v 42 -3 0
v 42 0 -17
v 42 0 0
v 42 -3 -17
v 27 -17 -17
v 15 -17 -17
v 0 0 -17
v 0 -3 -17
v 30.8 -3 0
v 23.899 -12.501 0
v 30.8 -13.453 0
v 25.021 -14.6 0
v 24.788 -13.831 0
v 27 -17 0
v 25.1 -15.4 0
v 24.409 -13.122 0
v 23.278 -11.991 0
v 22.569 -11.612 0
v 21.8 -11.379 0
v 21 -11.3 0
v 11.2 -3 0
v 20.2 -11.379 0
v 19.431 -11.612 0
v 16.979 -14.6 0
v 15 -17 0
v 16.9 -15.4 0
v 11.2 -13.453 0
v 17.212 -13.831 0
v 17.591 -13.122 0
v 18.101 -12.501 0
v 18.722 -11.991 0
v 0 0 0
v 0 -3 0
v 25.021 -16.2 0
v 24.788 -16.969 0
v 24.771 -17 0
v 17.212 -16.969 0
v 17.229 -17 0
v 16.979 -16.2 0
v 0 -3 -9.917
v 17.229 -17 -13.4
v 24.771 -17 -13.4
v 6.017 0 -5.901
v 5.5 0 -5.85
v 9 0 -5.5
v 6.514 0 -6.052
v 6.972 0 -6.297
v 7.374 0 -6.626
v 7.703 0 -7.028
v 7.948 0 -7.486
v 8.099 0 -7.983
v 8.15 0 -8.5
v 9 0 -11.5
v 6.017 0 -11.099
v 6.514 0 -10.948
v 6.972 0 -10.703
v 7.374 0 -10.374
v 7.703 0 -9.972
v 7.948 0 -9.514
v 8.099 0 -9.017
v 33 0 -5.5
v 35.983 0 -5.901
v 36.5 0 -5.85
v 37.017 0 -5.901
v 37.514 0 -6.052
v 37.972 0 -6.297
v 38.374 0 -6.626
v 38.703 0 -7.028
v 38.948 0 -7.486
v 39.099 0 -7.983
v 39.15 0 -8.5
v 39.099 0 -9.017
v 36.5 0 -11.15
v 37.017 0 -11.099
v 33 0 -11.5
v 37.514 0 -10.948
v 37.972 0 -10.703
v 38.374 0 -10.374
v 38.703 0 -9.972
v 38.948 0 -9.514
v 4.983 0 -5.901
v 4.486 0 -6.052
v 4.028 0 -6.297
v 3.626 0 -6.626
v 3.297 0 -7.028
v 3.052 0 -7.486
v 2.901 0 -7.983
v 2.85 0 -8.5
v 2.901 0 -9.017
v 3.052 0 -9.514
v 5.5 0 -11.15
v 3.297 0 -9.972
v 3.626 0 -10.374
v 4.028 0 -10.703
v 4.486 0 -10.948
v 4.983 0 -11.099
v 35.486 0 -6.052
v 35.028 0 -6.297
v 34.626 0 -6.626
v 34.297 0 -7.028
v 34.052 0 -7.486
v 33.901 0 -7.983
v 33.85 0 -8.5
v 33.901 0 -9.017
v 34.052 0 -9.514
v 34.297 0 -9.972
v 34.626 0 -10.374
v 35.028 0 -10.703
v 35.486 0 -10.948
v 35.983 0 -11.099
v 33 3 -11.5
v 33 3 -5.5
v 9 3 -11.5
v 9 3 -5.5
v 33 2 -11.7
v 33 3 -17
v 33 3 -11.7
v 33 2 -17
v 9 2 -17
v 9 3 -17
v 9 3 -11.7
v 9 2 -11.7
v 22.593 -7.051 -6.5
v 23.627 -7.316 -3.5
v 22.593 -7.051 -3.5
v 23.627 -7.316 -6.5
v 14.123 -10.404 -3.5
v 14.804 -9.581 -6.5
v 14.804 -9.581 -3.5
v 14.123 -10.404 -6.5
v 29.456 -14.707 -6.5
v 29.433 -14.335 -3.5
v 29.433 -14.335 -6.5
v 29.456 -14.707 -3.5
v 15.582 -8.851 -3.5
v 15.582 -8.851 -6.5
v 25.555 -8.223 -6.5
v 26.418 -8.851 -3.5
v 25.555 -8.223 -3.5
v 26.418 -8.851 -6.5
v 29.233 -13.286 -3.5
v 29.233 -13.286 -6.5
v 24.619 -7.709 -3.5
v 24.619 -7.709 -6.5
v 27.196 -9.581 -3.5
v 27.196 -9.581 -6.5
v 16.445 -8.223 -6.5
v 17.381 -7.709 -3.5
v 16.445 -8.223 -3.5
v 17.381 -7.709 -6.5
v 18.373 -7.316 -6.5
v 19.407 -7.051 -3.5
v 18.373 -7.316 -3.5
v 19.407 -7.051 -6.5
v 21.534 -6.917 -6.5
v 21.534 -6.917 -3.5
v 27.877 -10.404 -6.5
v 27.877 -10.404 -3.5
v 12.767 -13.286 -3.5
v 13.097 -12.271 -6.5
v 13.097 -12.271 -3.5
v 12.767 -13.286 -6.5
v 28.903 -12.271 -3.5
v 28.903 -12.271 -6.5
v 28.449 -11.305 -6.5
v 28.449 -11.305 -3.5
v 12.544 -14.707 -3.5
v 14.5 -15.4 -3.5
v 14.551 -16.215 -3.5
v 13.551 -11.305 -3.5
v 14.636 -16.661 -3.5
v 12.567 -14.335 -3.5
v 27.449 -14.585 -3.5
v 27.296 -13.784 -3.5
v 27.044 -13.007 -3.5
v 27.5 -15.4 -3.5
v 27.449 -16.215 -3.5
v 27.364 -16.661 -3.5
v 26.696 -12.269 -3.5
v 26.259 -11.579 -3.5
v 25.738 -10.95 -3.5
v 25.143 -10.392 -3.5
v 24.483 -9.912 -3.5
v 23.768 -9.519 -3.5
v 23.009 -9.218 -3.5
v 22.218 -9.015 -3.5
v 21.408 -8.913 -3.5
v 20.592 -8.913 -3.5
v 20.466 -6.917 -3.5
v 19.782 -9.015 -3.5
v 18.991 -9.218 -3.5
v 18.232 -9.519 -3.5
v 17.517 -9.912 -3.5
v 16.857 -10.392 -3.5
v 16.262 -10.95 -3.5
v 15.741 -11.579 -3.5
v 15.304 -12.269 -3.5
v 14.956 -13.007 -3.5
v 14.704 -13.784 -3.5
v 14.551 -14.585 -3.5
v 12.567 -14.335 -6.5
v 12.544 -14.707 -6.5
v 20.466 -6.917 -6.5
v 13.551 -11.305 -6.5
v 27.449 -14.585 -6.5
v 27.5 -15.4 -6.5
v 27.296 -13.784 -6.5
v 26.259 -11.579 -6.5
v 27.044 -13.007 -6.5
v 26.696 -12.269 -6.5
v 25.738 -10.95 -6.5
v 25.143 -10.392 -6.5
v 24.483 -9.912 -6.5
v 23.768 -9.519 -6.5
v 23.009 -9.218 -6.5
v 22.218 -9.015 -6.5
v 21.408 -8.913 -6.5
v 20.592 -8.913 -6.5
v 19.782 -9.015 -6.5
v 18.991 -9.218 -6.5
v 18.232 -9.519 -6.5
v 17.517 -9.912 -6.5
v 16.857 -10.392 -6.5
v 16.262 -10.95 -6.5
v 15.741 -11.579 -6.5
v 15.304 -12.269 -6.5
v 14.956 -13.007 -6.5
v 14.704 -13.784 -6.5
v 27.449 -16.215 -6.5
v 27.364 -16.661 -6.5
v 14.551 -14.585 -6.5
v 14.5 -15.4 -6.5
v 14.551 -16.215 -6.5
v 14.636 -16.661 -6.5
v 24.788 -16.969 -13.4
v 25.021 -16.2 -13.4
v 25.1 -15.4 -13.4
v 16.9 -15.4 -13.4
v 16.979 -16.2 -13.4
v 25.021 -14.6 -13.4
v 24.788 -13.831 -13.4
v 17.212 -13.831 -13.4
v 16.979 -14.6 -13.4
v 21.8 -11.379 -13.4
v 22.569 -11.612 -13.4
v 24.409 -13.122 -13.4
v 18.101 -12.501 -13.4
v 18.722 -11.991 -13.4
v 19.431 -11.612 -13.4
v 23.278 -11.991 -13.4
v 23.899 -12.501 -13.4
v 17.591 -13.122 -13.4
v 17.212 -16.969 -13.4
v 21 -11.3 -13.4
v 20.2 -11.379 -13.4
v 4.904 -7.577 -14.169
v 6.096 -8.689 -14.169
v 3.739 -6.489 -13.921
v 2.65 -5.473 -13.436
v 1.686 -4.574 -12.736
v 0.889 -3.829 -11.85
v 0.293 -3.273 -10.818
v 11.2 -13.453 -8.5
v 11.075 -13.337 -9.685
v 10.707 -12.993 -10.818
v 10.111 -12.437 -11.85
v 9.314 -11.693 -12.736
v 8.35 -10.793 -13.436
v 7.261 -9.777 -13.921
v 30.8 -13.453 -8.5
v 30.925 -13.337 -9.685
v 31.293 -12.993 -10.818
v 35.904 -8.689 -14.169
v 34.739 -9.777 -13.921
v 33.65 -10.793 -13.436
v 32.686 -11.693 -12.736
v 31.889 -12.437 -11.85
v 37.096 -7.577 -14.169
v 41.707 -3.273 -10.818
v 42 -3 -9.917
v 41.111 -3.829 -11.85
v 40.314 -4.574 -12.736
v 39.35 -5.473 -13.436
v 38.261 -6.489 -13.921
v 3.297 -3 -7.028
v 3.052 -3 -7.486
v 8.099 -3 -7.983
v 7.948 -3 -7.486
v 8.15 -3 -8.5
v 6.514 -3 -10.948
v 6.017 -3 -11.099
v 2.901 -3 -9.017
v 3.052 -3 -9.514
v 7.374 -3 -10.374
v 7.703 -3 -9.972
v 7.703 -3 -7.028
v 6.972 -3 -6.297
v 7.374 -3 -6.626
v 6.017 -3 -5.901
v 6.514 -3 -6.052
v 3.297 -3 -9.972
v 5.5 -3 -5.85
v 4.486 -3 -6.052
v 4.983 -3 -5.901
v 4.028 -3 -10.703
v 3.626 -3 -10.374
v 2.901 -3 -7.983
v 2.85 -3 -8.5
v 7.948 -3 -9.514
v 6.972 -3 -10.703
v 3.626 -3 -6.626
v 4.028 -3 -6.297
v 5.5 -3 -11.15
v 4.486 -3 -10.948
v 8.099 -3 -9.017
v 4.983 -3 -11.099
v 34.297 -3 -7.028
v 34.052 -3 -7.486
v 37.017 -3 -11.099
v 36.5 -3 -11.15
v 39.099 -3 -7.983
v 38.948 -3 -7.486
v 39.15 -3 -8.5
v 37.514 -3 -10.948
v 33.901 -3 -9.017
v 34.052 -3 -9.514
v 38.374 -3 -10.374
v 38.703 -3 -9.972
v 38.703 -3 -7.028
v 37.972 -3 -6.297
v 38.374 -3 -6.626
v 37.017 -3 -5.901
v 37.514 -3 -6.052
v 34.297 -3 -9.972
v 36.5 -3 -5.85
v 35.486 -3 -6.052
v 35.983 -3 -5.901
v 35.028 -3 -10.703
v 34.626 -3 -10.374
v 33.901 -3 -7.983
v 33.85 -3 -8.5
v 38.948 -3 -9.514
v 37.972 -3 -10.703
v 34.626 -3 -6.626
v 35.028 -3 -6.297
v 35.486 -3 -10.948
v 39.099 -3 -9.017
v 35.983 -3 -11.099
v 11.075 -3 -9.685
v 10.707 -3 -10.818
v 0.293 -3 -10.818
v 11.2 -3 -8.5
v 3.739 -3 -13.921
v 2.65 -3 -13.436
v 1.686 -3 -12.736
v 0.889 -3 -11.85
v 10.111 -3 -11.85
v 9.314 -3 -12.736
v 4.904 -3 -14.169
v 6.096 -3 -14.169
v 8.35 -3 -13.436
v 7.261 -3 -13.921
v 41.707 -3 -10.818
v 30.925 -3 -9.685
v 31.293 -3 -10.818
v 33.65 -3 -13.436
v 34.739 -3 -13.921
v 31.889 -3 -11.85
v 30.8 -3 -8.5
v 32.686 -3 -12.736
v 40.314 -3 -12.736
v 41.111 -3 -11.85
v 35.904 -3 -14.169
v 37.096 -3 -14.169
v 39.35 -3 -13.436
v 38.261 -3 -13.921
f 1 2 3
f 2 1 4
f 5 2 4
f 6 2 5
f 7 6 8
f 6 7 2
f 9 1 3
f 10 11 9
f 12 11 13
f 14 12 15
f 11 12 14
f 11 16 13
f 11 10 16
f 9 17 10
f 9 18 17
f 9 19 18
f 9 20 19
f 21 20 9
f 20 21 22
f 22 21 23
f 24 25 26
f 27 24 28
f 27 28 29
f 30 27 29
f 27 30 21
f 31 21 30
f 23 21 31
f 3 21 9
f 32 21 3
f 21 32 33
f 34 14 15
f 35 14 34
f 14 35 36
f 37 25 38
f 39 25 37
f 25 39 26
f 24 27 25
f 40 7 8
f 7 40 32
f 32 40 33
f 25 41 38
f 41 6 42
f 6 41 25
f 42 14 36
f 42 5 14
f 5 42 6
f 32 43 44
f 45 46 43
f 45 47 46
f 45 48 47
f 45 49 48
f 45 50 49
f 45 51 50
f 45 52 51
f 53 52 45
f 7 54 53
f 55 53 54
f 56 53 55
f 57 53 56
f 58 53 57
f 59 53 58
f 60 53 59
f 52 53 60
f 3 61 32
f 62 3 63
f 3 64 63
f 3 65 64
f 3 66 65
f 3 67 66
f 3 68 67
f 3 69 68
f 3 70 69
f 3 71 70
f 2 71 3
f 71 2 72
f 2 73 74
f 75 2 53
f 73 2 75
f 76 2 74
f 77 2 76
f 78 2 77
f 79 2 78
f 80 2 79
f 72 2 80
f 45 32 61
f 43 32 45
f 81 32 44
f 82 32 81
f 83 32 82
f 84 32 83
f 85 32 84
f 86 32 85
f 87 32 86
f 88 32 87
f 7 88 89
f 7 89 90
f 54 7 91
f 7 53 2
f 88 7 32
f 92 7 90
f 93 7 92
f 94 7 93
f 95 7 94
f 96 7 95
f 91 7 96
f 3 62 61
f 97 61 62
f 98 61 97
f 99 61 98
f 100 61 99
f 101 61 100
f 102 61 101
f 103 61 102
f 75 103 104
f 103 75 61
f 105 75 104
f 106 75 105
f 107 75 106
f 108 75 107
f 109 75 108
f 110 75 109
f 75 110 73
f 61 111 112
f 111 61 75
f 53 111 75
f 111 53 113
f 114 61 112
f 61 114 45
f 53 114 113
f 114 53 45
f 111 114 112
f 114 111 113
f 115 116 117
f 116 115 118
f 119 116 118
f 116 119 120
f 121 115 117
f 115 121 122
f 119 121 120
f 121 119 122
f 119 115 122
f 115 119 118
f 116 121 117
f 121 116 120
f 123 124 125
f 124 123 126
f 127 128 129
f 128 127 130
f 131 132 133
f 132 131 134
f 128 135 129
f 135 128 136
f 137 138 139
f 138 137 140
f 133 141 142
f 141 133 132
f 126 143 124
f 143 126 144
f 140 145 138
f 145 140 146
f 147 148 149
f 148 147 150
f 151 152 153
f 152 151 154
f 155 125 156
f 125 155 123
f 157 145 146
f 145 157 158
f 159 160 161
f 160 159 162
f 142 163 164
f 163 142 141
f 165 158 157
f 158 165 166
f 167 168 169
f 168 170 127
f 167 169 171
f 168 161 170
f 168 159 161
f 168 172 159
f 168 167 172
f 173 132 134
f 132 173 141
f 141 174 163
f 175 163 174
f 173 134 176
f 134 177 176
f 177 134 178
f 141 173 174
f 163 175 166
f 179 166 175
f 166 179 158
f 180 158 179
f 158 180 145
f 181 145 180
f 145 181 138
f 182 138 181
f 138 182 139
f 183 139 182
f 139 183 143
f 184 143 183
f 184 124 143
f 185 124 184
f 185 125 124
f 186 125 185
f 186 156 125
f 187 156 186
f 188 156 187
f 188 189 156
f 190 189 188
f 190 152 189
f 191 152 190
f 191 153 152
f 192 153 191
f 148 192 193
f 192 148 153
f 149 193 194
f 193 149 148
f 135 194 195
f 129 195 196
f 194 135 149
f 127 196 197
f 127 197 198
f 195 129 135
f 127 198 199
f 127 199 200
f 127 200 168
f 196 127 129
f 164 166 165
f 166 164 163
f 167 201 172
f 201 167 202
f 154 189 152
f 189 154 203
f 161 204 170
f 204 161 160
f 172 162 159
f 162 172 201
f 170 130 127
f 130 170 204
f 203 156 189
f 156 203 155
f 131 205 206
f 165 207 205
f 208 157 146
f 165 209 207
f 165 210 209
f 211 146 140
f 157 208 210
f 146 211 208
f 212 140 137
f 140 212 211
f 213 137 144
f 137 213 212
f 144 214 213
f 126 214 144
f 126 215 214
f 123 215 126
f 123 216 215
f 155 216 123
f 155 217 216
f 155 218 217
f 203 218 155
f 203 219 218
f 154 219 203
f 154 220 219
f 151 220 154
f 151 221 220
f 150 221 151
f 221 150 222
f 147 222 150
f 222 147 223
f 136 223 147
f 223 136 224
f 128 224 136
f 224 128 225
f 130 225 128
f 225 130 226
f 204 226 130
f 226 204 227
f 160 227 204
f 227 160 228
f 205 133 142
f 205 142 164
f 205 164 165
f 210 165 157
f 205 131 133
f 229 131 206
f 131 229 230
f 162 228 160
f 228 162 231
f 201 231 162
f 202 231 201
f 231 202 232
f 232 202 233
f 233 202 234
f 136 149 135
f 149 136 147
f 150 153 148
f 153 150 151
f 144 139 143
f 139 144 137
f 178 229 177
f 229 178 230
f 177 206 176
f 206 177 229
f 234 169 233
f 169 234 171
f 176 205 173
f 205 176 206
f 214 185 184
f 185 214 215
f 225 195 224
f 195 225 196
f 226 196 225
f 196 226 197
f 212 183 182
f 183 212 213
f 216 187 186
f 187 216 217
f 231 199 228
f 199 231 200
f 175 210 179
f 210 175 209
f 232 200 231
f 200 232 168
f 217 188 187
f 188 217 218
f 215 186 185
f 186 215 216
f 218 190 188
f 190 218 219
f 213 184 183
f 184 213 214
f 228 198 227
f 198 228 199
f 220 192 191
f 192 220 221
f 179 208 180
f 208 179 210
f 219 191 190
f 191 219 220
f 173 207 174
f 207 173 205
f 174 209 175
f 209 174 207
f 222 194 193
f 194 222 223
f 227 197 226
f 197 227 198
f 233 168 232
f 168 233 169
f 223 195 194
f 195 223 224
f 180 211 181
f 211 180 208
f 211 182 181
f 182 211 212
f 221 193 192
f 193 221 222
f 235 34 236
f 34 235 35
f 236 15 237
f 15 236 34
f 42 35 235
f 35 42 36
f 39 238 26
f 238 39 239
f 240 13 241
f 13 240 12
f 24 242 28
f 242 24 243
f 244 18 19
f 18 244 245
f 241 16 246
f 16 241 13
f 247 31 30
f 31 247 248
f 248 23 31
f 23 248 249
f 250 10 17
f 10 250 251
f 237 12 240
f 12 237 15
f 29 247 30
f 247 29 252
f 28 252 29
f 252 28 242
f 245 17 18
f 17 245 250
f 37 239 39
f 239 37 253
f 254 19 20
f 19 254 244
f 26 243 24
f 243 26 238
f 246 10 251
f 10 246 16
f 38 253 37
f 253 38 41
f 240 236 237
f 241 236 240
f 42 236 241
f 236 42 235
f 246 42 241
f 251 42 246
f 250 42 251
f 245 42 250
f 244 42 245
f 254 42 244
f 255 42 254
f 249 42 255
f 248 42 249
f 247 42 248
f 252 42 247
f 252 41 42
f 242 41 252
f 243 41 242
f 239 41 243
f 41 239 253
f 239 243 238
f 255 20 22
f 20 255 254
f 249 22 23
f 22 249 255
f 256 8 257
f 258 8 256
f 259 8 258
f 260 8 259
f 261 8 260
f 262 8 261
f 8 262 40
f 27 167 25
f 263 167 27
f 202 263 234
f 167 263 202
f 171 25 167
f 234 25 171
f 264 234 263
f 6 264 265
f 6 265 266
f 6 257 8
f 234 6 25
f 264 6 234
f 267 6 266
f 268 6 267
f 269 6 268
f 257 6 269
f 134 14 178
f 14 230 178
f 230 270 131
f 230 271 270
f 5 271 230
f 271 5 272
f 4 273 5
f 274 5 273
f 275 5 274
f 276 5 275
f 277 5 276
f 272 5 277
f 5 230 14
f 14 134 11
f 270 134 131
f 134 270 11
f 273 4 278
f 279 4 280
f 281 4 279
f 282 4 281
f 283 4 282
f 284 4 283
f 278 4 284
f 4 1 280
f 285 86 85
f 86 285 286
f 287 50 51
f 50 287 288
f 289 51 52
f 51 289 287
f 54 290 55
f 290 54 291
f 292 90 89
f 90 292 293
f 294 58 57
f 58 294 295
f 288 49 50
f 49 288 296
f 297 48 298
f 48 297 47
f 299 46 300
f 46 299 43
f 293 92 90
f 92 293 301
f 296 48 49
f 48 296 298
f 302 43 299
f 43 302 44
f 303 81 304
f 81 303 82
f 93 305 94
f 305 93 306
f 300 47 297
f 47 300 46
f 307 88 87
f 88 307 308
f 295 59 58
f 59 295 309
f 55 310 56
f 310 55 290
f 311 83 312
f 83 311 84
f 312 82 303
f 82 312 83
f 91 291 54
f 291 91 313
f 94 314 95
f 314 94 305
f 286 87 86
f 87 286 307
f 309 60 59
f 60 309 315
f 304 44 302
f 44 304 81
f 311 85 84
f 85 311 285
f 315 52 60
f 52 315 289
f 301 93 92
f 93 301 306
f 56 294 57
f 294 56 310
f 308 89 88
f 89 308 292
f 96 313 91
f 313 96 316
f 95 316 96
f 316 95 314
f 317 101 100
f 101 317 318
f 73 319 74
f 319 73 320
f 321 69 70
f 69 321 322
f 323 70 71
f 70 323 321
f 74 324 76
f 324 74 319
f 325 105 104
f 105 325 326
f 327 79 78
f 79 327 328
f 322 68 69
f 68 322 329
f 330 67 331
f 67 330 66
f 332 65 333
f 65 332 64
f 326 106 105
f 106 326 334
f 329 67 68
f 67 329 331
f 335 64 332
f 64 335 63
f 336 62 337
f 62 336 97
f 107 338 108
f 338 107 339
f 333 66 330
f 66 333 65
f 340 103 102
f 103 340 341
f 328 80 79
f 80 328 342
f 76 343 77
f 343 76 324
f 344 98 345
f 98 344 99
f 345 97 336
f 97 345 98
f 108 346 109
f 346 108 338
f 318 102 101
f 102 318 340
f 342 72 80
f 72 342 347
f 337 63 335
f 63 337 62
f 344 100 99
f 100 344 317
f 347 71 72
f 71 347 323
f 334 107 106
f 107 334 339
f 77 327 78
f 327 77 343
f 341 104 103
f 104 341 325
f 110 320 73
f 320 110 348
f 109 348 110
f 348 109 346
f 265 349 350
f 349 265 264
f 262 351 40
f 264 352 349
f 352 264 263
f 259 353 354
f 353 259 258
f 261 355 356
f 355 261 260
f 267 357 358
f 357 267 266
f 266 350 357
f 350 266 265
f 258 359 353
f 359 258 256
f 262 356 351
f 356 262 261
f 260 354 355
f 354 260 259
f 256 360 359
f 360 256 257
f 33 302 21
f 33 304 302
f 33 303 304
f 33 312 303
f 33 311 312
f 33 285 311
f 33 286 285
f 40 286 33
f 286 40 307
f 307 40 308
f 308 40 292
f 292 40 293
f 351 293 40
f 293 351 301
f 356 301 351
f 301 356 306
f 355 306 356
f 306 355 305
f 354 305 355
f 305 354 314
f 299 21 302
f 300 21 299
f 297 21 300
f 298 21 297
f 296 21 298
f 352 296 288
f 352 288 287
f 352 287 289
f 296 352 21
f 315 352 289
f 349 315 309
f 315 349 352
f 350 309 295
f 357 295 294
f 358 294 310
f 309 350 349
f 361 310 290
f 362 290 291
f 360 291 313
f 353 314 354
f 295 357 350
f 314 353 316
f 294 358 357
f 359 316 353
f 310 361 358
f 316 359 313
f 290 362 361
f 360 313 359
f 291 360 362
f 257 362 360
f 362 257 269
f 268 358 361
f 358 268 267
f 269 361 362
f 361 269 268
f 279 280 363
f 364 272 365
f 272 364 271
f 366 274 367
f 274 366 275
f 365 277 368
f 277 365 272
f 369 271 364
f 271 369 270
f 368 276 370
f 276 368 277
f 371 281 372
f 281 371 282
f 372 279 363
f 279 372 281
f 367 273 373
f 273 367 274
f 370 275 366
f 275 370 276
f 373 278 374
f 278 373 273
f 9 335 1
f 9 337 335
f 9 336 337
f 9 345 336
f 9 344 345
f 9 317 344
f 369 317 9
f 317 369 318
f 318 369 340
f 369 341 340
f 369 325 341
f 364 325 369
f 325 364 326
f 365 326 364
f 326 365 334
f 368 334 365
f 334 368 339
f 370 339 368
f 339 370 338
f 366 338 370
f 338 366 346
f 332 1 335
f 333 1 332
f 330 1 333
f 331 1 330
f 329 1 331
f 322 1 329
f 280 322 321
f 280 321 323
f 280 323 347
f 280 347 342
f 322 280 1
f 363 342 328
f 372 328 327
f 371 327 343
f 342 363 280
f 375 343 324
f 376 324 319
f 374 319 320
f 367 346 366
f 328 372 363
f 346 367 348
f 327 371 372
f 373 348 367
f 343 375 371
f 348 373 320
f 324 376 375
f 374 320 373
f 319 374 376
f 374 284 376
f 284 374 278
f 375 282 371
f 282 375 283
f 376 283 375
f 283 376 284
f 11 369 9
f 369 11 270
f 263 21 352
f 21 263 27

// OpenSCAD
// RebeliX
//
// y-rod-holder
// GNU GPL v3
// Martin Neruda <neruda@reprap4u.cz>
// http://www.reprap4u.cz
// Modified by Andras Biro

/* [Screw] */

//Diameter of the screw head. 1mm additional spacing recommended
screw_head_diameter = 11.4;
//Diameter of the screw hole. 0.2 - 0.5mm additional spacing recommended
screw_diameter = 5.3;
//Width of the hammer nut. 1mm additional spacing recommended
hammer_nut_width = 7;
//Distance of screw hole center from the edge
holes_from_edge = 5.5;

/* [Base shape] */

width = 42;
height = 17;
base_thickness = 3;
thickness = 17;
rod_diameter = 8;
//Distance of the zip tie from the middle
zip_tie_offset = 3;

/* [Extrusion profile settings] */
//Width of the notch in the extrusion
slot_width = 6;
//Depth of the plastic that goes to the extrusion
slot_depth = 3;
//Enable or disable the support for the plastic that goes to the extrusion
with_support = 1; //[1:Enable, 0:Disable]
//Distance between the support and the part. Recommended to use the print layer height
support_distance = 0.2;

module y_rod_holder_base(){
  //base shape
  cube([width,thickness,height]);
  //notch to the extrusion
  notch_width = width-2*(holes_from_edge+hammer_nut_width/2);
  translate([width/2,0,height/2]) cube([notch_width,slot_depth*2,slot_width],center=true);
  //support
  if ( with_support ) {
    support_height = (height-slot_width)/2-support_distance;
    translate([width/2-notch_width/2,-slot_depth,height-support_height]) cube([notch_width,1,support_height]);
  }
}

module y_cuts(){
  // rod slot
  translate([width/2,thickness - 1.6,-0.1]) cylinder(h=(height/2)+5,r=(rod_diameter/2)+0.1,$fn = 32);
  // cut triangles from the sides
  cut_triangle_adj = (width-rod_diameter)/2-2;
  cut_triangle_opp = thickness-base_thickness;
  cut_triangle_hyp=sqrt(pow(cut_triangle_adj,2)+pow(cut_triangle_opp,2));
  angle = atan2(cut_triangle_opp,cut_triangle_adj);
  translate([0,base_thickness,0]) rotate([0,0,angle]) cube([cut_triangle_hyp,20,height]);
  translate([width-cut_triangle_adj,thickness,0]) rotate([0,0,-angle]) cube([cut_triangle_hyp,20,height]);

  //screw holes
  translate([holes_from_edge,0,height/2]) rotate([-90,0,0]) cylinder(h=40,r=screw_diameter/2,$fn = 32,center=true);
  translate([width-holes_from_edge,0,height/2]) rotate([-90,0,0]) cylinder(h=40,r=screw_diameter/2,$fn = 32,center=true);
  //deepen for screw heads
  translate([holes_from_edge,base_thickness,height/2]) rotate([-90,0,0]) cylinder(r = screw_head_diameter/2, h = 20, $fn = 30);
  translate([width-holes_from_edge,base_thickness,height/2]) rotate([-90,0,0]) cylinder(r = screw_head_diameter/2, h = 20, $fn = 30);
 
  //extend screw head deepening towards the printer
  translate([width-holes_from_edge-screw_head_diameter/2,base_thickness,0]) cube([screw_head_diameter,20,height/2]);
  translate([holes_from_edge-screw_head_diameter/2,base_thickness,0]) cube([screw_head_diameter,20,height/2]);
  
  // zip tie
  translate([width/2,thickness - 1.6,height/2 - zip_tie_offset - 2]) difference(){
    cylinder(r=rod_diameter/2+4.5,h=3,$fn=50);
    cylinder(r=rod_diameter/2+2.5,h=3.1,$fn=50);
  }
}

rotate([180,0,0]) 
difference(){
	y_rod_holder_base();
	y_cuts();
}	
